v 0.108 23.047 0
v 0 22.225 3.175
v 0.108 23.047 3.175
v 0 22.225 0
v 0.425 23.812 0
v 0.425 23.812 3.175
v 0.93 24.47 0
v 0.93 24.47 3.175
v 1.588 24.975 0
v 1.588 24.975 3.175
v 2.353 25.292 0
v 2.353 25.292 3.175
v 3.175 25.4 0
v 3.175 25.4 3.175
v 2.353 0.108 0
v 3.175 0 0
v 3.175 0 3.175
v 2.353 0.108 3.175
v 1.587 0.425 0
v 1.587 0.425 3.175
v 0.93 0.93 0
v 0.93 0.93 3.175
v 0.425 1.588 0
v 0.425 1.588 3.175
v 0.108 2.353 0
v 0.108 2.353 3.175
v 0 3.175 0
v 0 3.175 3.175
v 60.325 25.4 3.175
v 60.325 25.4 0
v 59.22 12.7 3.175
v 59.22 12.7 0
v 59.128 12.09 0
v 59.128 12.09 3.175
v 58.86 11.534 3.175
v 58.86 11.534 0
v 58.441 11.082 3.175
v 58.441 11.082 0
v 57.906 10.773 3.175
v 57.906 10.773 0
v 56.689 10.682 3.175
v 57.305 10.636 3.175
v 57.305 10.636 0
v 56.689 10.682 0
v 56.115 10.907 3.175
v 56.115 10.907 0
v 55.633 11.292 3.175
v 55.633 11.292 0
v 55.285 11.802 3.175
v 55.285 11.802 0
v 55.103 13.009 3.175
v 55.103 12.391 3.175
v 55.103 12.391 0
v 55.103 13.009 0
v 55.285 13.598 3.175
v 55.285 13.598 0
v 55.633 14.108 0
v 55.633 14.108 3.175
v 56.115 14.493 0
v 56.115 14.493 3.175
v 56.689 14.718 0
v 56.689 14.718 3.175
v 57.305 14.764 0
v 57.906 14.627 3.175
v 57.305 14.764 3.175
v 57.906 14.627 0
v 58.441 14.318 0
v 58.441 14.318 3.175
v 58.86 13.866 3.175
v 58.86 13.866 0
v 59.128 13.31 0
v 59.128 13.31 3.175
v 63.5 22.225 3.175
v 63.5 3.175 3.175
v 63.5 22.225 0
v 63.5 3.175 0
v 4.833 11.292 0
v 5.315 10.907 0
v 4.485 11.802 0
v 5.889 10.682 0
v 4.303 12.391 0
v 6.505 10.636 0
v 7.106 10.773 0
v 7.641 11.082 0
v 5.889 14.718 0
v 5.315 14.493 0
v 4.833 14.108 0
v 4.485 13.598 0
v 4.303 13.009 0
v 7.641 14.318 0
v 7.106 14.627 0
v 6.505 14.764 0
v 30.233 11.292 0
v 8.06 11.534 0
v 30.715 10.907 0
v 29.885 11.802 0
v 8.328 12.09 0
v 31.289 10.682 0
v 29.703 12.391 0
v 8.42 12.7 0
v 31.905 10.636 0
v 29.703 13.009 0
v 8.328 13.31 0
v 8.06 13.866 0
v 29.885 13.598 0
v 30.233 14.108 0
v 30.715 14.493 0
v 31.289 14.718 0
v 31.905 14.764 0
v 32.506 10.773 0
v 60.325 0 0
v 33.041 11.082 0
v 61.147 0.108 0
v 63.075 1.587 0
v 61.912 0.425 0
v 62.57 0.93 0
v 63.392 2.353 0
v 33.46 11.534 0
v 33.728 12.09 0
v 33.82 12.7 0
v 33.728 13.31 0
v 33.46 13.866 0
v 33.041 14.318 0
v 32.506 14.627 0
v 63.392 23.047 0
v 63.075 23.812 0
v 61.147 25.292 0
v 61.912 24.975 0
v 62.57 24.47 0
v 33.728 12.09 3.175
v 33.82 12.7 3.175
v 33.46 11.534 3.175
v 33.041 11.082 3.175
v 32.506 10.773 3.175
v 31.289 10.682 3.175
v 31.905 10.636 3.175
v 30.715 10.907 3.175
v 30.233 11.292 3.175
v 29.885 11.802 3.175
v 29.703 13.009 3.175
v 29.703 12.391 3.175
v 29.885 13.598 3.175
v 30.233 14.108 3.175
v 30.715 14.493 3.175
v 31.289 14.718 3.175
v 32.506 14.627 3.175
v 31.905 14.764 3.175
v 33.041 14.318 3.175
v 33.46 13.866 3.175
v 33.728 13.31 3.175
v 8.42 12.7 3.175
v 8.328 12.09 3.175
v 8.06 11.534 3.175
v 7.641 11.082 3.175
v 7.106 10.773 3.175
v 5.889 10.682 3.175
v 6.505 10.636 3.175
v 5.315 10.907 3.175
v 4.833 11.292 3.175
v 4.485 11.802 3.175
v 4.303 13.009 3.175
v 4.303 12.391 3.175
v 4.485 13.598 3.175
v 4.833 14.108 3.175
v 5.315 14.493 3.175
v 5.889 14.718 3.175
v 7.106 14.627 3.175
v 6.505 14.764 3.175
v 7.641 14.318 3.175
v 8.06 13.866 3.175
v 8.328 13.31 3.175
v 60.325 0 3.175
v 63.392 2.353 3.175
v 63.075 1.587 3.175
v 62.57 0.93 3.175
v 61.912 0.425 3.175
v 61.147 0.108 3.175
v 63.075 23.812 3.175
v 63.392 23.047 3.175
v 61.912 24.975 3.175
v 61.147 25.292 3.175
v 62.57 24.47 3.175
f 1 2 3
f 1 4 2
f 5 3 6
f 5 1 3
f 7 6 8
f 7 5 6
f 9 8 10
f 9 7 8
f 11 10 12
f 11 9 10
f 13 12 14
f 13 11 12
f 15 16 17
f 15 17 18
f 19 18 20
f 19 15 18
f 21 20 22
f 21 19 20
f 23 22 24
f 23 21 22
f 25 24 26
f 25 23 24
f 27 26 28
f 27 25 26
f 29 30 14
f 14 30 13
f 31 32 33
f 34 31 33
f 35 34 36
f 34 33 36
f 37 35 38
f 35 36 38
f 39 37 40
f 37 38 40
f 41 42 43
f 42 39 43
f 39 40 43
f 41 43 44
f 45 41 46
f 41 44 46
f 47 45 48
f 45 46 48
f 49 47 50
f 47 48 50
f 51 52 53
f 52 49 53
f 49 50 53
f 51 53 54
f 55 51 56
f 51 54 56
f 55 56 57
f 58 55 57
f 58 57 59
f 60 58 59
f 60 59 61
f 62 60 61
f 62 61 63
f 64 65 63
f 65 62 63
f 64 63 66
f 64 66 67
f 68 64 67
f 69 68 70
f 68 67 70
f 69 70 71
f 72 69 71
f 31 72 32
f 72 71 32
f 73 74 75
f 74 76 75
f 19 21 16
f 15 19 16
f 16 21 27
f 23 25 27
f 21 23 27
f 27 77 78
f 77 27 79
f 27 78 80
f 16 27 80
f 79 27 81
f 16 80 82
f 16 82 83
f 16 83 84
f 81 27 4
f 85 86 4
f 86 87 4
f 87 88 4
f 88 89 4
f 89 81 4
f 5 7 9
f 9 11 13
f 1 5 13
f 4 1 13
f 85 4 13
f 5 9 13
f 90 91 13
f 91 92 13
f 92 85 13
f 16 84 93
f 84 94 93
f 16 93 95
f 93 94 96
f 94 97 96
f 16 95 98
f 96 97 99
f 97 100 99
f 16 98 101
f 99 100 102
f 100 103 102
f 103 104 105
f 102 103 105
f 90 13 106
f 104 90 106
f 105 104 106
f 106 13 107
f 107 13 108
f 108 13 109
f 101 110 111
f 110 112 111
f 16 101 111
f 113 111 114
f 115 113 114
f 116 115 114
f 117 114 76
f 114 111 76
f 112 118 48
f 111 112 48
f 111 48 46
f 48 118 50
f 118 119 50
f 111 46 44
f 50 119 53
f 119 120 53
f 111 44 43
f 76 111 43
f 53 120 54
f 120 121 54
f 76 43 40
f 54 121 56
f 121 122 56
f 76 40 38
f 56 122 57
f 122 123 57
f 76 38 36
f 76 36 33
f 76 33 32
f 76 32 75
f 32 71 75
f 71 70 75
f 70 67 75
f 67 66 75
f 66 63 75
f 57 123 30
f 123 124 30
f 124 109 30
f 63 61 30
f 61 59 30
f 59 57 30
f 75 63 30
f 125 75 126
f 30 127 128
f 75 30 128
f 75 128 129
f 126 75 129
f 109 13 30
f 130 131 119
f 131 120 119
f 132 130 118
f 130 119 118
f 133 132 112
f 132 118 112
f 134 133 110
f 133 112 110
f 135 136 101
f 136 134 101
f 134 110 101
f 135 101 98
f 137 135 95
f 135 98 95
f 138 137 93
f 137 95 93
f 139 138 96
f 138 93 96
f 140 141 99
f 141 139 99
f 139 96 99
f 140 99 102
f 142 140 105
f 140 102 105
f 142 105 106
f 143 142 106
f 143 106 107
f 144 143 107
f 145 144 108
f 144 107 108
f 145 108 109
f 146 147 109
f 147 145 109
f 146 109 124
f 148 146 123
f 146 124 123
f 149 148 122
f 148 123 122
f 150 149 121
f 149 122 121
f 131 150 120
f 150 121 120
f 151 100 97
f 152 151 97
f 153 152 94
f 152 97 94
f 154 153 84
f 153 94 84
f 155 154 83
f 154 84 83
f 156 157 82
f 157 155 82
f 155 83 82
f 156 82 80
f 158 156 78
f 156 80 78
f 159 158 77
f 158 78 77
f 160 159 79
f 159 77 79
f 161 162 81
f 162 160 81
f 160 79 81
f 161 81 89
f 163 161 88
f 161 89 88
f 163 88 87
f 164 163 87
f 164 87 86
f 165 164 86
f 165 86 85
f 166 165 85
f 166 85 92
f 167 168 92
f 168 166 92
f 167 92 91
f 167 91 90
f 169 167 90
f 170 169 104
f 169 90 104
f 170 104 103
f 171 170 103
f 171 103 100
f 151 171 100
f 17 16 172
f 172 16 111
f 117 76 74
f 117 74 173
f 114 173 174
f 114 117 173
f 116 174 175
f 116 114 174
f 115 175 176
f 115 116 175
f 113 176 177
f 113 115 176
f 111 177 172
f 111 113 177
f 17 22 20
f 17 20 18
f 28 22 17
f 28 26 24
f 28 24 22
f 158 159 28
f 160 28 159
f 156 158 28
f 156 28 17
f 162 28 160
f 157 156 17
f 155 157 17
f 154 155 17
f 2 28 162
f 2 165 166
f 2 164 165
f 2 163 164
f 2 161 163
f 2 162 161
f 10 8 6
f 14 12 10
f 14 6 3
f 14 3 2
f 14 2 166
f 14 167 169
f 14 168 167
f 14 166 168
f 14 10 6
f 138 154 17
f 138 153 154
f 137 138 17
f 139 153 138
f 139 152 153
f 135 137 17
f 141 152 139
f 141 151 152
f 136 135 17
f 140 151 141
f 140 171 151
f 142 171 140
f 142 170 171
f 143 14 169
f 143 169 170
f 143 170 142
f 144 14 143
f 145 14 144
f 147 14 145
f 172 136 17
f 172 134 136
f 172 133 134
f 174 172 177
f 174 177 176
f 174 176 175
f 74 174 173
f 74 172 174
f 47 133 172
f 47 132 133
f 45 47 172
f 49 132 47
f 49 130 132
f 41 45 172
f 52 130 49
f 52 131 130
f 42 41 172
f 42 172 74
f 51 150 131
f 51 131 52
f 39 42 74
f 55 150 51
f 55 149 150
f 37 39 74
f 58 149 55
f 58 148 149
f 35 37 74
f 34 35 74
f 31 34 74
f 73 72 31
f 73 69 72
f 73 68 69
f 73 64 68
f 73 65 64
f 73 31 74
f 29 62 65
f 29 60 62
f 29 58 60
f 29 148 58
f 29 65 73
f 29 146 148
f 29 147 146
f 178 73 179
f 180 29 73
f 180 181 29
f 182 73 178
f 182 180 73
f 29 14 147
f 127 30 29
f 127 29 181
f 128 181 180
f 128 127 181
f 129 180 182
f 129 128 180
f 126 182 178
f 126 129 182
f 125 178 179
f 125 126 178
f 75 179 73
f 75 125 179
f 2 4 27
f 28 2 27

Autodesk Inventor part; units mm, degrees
ref_plane "YZ Plane" through (0, 0, 0) normal (1, 0, 0) x (0, 1, 0)
ref_plane "XZ Plane" through (0, 0, 0) normal (0, 1, 0) x (-1, 0, 0)
ref_plane "XY Plane" through (0, 0, 0) normal (0, 0, 1) x (1, 0, 0)
sketch "Sketch1" plane through (0, 0, 0) normal (0, 0, 1) x (1, 0, 0)
  line L0 (3.175, 0) -> (60.325, 0)
  line L1 (63.5, 3.175) -> (63.5, 22.225)
  line L2 (60.325, 25.4) -> (3.175, 25.4)
  line L3 (0, 22.225) -> (0, 3.175)
  circle A0 centre (6.35, 12.7) radius 2.0701
  line L4 (0, 12.7) -> (63.5, 12.7) construction
  circle A1 centre (31.75, 12.7) radius 2.0701
  circle A2 centre (57.15, 12.7) radius 2.0701
  arc A3 (3.175, 25.4) -> (0, 22.225) centre (3.175, 22.225) ccw
  arc A4 (63.5, 22.225) -> (60.325, 25.4) centre (60.325, 22.225) ccw
  arc A5 (60.325, 0) -> (63.5, 3.175) centre (60.325, 3.175) ccw
  arc A6 (0, 3.175) -> (3.175, 0) centre (3.175, 3.175) ccw
  point P0 (0, 0)
  point P1 (63.5, 25.4)
  point P2 (63.5, 0)
  point P3 (0, 25.4)
  dimension "d0" = 63.5
  dimension "d1" = 25.4
  dimension "d2" = 6.35
  dimension "d3" = 4.1402
  dimension "d6" = 25.4
  dimension "d11" = 3.175
extrude "Extrusion1" add sketch "Sketch1" along normal blind 3.175
properties part number "Spacer 4" material "ABS Plastic"
